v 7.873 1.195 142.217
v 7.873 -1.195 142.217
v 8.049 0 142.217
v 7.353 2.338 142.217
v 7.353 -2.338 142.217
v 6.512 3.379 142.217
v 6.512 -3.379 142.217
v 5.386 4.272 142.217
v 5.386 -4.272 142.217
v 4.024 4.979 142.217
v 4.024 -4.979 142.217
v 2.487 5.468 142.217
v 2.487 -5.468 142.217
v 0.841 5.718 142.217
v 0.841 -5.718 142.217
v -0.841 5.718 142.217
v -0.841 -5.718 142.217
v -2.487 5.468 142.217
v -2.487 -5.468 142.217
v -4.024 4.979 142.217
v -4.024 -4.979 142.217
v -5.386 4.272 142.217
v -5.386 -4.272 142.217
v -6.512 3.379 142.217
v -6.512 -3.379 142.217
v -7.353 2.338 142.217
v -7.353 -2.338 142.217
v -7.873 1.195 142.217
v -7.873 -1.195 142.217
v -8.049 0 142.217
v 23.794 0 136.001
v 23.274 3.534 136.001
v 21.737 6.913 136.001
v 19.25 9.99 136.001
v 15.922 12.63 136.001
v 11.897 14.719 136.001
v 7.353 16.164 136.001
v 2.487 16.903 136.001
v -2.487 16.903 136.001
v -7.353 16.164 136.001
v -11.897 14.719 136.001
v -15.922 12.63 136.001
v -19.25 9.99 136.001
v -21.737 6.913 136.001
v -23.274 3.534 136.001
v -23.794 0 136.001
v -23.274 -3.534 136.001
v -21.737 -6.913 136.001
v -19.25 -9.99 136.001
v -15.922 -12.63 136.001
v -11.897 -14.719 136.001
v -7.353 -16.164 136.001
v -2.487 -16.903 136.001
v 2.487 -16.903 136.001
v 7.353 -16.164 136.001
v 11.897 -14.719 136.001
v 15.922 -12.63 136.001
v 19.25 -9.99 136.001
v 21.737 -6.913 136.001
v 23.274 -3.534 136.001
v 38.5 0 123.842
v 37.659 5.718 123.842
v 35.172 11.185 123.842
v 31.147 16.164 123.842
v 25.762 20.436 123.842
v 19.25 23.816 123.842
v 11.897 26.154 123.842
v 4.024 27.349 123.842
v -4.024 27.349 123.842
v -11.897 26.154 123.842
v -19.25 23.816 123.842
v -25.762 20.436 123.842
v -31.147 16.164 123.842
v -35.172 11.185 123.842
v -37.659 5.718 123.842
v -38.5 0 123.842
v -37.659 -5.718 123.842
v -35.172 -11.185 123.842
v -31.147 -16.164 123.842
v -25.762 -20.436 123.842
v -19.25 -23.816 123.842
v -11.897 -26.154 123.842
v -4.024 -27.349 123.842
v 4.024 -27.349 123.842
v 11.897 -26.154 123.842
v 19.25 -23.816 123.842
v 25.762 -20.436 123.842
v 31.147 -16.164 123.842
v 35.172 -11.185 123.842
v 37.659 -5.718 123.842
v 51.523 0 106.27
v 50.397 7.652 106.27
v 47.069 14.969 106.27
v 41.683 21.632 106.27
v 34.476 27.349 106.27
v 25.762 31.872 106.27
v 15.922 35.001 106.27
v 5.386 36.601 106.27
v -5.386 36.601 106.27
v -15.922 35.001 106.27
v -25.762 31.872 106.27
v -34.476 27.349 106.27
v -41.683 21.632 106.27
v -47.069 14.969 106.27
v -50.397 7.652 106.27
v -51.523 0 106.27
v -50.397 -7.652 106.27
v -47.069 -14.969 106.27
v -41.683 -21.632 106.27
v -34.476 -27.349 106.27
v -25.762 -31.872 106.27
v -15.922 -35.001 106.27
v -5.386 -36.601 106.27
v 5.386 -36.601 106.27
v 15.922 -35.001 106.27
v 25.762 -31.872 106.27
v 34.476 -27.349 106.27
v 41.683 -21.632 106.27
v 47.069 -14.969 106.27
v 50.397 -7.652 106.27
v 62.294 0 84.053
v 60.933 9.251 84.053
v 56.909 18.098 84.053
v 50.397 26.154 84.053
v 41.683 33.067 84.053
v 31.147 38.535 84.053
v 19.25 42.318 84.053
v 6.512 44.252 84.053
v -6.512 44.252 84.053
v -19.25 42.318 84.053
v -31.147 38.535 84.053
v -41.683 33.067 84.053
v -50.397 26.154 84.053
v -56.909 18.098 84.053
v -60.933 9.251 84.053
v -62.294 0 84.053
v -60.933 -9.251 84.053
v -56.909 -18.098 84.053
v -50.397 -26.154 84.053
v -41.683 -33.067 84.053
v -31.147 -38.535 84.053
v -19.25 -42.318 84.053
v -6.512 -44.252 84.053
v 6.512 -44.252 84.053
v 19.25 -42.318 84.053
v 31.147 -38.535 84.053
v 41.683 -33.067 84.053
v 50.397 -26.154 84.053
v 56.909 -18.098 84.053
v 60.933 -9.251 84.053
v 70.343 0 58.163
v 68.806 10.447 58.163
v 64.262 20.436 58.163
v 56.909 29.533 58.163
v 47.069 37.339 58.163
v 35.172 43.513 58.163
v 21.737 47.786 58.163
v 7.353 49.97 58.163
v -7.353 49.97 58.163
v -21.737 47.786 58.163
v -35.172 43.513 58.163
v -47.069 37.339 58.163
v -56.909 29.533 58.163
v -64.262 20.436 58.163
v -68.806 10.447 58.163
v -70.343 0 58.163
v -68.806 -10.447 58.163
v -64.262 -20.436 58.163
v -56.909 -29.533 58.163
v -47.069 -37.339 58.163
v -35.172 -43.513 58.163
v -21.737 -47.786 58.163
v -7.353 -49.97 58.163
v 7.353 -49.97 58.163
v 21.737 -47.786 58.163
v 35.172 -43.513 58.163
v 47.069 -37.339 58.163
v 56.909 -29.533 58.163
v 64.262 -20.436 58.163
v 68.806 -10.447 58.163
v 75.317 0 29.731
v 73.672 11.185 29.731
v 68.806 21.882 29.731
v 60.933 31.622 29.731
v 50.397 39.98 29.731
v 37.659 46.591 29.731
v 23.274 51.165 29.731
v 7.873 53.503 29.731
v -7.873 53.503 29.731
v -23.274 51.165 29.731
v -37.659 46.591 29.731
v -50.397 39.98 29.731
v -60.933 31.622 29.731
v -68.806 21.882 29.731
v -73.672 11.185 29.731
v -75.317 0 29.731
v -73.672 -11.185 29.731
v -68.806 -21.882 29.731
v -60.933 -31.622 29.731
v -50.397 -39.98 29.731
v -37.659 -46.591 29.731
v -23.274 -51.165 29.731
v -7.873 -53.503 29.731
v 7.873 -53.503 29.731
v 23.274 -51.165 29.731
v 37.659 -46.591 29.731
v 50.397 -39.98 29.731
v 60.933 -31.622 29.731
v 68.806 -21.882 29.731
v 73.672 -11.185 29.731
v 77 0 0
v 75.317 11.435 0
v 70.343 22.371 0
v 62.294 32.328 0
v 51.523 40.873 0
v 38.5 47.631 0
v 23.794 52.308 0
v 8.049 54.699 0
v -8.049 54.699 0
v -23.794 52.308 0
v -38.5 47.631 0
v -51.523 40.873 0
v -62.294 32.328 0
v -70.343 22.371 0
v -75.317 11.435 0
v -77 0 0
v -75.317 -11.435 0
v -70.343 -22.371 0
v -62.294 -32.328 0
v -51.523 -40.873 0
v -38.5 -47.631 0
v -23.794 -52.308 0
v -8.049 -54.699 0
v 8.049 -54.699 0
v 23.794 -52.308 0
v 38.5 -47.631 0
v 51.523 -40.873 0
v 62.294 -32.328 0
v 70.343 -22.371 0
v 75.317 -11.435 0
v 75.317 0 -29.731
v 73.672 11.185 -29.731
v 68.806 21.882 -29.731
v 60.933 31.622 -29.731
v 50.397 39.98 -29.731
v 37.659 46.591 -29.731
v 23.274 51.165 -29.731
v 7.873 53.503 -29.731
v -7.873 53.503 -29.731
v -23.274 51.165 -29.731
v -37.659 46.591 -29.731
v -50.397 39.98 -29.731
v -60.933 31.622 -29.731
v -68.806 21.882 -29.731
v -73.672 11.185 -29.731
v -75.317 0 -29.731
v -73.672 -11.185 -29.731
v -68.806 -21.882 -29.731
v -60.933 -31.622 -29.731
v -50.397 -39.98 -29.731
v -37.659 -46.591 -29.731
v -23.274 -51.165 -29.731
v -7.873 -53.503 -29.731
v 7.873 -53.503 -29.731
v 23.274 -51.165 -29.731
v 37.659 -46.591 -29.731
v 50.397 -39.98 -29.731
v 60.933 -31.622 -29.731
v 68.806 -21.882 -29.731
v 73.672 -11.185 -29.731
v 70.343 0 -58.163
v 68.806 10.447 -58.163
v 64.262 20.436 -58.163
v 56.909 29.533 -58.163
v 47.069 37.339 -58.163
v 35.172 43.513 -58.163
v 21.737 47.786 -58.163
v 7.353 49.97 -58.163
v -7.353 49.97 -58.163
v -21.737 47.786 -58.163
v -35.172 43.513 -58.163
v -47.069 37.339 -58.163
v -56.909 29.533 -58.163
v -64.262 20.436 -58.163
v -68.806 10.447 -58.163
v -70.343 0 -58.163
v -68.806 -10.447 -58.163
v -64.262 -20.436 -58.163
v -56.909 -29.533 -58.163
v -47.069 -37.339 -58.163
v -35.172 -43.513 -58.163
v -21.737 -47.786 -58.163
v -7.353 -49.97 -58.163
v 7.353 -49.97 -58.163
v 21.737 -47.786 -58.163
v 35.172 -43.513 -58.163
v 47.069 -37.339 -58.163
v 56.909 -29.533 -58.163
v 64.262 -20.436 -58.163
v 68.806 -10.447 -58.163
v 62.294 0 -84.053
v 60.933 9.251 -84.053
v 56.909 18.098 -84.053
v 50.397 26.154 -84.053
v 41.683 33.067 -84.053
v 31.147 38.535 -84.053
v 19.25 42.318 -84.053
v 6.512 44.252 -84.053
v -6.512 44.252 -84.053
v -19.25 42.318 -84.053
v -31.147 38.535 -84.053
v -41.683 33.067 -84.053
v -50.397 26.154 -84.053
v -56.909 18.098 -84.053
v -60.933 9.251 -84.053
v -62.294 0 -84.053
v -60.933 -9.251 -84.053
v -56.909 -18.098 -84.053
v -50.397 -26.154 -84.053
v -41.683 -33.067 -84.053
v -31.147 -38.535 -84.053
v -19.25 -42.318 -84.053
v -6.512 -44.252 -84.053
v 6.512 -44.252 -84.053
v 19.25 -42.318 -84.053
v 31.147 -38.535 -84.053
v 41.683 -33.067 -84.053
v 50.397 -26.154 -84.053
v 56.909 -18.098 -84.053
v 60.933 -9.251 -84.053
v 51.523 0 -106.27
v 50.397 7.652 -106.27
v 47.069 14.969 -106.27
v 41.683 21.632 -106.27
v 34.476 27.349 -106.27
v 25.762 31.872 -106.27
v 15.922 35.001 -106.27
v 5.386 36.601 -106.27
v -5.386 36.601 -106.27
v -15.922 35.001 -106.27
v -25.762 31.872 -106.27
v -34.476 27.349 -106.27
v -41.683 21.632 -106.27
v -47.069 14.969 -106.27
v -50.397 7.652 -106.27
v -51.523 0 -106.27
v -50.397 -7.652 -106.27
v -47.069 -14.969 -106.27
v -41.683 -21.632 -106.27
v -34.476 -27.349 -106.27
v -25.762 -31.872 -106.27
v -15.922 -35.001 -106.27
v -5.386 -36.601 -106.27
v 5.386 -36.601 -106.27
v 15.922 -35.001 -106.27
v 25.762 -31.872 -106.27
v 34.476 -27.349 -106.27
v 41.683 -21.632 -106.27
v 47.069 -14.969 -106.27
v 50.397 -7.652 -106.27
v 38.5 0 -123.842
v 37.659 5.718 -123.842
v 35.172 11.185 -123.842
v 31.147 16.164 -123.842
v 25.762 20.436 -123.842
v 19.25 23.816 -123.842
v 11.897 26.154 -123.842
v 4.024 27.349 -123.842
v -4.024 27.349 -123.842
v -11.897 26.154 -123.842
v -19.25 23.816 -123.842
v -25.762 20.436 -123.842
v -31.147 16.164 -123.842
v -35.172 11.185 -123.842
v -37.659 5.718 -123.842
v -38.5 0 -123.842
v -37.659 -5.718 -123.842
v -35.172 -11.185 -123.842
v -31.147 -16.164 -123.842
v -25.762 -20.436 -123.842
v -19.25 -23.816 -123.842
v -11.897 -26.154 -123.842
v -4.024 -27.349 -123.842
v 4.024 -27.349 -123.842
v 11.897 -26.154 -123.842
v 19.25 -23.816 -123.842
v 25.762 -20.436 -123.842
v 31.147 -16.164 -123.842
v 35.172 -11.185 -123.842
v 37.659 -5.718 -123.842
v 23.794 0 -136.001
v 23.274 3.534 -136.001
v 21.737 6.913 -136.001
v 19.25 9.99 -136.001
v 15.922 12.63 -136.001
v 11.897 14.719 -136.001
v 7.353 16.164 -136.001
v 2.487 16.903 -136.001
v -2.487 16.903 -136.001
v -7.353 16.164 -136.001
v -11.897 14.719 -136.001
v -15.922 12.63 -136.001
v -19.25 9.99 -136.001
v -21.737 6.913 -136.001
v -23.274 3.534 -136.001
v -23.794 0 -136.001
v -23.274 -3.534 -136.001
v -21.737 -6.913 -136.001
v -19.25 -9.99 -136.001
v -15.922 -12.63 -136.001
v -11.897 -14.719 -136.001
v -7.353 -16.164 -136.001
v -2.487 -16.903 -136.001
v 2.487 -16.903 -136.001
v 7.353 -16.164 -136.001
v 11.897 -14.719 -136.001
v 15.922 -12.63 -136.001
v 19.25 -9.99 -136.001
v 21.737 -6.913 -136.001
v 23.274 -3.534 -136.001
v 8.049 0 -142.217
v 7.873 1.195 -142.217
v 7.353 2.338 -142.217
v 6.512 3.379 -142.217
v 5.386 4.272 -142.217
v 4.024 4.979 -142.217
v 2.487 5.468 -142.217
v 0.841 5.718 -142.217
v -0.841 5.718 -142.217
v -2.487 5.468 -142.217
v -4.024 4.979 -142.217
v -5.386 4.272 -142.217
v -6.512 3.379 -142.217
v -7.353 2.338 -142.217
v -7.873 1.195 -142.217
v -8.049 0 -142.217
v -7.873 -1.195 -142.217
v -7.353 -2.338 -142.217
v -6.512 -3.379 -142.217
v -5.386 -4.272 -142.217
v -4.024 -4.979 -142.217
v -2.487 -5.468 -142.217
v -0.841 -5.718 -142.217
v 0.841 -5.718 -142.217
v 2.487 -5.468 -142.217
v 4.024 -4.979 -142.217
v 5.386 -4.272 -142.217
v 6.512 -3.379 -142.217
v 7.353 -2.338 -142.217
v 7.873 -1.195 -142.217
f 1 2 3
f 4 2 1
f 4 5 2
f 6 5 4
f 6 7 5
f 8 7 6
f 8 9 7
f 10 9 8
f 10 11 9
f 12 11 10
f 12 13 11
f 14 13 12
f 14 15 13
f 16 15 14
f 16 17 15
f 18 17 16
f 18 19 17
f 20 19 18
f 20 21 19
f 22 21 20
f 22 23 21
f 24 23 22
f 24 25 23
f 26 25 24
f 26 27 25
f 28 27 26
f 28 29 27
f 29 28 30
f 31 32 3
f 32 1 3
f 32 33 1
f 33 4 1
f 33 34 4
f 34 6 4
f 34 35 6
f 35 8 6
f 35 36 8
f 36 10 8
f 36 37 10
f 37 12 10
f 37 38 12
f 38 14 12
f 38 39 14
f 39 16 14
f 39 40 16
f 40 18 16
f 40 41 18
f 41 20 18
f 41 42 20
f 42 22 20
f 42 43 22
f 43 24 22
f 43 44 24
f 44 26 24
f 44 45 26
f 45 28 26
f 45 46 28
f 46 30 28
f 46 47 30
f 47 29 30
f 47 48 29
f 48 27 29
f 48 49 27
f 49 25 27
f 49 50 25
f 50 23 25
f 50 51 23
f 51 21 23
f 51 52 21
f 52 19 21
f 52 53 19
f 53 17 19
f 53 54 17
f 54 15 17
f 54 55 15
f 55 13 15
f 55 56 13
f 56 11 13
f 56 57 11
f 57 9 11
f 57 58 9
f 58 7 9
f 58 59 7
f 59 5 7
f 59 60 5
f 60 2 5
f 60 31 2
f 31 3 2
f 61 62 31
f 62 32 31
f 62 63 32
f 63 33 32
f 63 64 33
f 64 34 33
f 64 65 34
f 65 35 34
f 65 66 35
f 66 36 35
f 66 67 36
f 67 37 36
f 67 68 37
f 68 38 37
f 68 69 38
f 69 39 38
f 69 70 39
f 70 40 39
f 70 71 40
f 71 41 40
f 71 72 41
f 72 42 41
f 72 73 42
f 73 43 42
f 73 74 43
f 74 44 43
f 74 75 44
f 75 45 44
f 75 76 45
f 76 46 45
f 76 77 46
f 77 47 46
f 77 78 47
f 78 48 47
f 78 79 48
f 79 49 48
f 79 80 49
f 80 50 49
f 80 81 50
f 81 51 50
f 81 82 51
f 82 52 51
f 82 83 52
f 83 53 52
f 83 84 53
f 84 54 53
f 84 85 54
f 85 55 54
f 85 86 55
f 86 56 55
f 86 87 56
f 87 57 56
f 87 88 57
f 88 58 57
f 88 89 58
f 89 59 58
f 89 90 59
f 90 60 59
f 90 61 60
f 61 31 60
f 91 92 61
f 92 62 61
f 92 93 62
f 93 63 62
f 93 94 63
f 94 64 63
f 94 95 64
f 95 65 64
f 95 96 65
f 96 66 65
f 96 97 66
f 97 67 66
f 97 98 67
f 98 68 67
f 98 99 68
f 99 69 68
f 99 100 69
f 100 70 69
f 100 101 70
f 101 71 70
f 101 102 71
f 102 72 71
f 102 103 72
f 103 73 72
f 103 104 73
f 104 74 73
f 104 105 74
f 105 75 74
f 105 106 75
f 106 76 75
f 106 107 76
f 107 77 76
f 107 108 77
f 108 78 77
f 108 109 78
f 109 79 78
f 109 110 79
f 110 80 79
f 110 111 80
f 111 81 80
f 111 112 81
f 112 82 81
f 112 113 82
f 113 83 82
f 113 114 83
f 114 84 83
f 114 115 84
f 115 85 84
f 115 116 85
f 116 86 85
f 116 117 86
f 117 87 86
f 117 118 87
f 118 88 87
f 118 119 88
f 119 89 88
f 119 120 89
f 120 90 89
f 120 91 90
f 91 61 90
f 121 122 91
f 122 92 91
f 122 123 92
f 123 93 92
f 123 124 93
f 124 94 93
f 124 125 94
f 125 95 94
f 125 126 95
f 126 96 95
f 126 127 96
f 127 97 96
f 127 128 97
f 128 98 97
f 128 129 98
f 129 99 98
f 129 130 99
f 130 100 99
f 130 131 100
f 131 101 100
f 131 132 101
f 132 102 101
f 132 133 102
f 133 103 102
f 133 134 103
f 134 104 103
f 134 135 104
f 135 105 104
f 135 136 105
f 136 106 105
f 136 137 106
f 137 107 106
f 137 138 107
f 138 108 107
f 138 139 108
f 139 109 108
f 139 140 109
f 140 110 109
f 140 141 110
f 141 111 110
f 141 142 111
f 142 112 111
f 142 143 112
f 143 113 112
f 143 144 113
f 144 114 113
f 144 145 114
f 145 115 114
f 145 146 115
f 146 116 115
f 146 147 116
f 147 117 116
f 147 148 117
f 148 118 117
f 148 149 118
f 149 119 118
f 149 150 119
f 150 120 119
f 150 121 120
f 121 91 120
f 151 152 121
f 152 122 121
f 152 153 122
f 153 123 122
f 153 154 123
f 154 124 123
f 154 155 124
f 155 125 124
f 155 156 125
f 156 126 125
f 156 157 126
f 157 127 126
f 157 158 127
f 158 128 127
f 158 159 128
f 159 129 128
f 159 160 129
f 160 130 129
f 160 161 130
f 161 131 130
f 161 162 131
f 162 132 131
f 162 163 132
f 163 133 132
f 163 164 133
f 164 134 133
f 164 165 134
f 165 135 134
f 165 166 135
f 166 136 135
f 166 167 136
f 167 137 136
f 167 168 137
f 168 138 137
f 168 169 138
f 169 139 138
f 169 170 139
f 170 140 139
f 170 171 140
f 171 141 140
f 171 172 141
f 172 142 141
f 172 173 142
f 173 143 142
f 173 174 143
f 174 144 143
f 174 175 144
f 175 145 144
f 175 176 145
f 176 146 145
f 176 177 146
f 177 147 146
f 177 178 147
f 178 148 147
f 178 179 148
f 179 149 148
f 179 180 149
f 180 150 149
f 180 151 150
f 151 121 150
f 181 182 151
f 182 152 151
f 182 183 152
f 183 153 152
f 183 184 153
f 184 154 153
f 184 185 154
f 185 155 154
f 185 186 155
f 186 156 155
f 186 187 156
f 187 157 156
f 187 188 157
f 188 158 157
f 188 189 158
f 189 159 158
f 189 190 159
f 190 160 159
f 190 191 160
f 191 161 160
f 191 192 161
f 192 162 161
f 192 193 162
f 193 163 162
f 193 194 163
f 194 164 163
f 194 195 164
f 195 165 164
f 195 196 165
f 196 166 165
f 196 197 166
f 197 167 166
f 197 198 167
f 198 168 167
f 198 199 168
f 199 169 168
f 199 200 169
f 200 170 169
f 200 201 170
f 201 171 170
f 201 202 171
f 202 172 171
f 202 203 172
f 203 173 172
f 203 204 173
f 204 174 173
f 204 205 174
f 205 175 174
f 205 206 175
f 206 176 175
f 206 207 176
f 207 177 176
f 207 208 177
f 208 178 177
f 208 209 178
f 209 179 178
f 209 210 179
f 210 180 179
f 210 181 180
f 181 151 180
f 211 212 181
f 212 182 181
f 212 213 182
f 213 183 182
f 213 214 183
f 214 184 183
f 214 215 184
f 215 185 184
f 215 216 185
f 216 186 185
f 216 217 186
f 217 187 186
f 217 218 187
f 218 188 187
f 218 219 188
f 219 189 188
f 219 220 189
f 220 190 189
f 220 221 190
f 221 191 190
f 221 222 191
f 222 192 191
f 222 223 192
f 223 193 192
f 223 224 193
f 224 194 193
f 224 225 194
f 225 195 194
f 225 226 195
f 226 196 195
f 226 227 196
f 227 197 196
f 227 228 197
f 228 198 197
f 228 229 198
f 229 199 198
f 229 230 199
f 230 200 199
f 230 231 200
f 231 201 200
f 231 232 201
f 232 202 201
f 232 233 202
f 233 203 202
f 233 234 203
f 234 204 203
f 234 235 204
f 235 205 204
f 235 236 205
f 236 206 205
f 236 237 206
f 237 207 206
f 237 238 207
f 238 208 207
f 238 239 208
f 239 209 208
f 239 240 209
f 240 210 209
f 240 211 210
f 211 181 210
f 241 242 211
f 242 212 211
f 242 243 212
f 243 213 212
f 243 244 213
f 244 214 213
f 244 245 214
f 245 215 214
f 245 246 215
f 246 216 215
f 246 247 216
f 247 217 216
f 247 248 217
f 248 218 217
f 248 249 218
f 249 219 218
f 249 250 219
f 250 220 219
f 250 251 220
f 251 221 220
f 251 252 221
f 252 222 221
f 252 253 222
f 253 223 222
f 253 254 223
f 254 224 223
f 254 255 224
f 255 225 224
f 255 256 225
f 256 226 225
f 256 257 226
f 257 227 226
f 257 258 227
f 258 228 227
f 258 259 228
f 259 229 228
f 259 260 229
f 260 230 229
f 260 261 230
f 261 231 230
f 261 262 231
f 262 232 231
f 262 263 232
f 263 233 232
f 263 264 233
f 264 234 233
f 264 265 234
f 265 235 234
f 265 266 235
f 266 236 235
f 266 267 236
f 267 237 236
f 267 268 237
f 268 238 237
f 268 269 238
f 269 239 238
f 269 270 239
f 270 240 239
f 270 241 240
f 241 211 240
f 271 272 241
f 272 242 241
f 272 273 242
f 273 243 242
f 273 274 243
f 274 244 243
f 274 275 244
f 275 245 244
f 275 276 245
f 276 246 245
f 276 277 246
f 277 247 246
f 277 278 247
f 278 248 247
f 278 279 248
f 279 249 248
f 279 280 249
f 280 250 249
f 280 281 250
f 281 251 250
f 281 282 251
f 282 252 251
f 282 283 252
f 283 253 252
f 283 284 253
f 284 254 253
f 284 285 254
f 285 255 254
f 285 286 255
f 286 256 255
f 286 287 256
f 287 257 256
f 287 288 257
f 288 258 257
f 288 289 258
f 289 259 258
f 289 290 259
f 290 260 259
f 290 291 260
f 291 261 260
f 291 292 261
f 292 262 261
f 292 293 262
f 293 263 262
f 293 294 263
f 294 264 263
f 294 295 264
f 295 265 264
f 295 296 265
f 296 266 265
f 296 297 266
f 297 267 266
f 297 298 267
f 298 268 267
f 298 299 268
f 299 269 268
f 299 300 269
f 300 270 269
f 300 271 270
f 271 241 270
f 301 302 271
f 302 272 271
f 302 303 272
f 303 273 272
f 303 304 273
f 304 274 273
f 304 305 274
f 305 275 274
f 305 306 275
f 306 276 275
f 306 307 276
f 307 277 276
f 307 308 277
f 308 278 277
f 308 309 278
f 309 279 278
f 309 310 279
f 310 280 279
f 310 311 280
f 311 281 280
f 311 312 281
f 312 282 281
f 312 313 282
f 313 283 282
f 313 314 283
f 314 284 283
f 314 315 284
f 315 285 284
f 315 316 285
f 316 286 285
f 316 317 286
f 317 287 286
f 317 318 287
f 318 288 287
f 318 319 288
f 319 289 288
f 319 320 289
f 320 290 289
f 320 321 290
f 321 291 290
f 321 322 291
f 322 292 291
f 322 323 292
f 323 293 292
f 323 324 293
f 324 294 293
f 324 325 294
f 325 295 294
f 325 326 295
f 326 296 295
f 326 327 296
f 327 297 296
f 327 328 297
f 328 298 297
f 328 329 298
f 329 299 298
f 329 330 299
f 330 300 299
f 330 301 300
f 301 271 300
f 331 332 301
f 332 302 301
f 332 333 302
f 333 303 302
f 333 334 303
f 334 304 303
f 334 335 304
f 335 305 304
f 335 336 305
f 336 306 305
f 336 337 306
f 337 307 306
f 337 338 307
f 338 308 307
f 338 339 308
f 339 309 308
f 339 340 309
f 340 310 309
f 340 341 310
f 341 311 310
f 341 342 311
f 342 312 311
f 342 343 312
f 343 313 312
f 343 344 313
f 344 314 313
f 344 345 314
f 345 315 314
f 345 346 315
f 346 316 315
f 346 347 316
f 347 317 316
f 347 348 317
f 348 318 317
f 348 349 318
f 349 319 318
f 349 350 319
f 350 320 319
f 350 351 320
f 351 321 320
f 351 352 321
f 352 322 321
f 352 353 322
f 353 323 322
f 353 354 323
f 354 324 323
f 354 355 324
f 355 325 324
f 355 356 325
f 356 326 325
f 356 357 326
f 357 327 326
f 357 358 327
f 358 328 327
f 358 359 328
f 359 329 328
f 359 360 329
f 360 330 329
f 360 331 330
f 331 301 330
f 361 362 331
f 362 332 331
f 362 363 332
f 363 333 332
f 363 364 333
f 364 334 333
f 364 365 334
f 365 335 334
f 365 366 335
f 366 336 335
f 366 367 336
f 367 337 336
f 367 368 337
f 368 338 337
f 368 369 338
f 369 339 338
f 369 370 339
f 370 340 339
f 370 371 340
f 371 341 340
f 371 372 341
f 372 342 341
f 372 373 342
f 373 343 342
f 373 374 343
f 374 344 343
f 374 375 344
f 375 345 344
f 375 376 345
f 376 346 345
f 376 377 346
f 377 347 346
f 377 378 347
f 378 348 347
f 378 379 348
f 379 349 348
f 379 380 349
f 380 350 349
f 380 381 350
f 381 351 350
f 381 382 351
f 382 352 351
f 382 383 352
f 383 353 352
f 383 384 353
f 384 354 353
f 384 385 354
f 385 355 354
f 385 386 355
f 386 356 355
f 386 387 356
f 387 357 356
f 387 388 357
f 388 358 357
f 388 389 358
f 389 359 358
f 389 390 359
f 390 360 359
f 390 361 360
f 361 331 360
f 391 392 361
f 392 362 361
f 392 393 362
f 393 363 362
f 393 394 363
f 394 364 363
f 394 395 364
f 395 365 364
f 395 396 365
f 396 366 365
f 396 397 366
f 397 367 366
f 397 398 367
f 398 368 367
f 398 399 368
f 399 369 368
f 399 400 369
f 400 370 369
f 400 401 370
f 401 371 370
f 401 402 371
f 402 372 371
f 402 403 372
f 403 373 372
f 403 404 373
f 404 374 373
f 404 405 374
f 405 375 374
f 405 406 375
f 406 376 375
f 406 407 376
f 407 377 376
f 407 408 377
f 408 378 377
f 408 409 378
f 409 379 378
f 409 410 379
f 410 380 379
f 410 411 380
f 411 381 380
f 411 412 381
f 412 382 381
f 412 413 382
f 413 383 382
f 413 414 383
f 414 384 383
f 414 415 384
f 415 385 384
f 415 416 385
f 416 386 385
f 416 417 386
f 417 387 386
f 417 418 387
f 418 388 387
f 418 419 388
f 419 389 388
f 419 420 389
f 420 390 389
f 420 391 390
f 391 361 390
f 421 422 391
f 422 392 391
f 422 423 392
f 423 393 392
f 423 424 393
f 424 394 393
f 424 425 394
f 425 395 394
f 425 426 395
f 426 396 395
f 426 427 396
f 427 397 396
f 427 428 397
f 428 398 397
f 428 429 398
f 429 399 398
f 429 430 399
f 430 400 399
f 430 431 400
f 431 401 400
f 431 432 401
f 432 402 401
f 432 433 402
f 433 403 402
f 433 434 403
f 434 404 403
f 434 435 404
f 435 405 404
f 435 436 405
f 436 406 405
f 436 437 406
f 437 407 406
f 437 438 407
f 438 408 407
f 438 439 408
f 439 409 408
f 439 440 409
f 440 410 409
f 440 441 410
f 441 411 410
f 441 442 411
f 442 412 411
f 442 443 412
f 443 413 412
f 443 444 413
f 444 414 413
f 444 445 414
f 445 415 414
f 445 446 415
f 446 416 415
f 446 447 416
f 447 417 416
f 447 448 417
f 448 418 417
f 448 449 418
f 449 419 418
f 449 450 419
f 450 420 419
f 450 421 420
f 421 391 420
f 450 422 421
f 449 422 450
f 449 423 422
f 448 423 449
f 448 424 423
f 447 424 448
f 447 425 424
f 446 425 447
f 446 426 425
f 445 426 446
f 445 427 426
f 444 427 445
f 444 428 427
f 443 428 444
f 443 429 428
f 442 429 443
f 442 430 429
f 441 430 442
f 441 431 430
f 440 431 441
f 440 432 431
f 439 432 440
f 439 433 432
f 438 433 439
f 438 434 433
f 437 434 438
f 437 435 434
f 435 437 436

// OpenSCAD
// Generated by SolidPython 1.0.1 on 2020-07-29 00:46:47


scale(v = [7, 5, 13]) {
	sphere(r = 11);
}
/***********************************************
*********      SolidPython code:      **********
************************************************
 
# import packages: SolidPython
from solid import *
from solid.utils import *
from itertools import chain, combinations, permutations


class Resize:

    def __init__(self, scad_file):
        self.scad_file = scad_file
        #self.scad_file = import_scad(scad_file)
        # cone/cylinder param:
        self.r1 = 0
        self.r2 = 0
        self.h = 0
        # rectangular prism param:
        self.w = 0
        self.l = 0
        # ellipse param:
        self.r = 0

    # import OpenScad code (file name corresponds to shape)


    # classify shape + parameters
    def assign(self, param1, param2, param3):
        if self.scad_file == 'cone.scad':
            self.r1 = param1
            self.r2 = param2
            self.h = param3
        elif self.scad_file == 'cylinder.scad':
            self.r1 = param1
            self.r2 = param2
            self.h = param3
        elif self.scad_file == 'rectangularPrism.scad':
            self.h = param1
            self.l = param2
            self.w = param3
        else:
            self.r = param1
            self.h = param2

    # resize parameters
    def iterate(self):
        x = range(3, 20, 2)
        i = 1
        if self.scad_file == 'cone.scad':
            tempList = list(permutations(x, 2))
            for temp in tempList:
                param1 = temp[0]
                param2 = temp[1]
                filepath = 'produced_scad_files/' + 'cone' + str(param1) + '_' + str(param2) + '_' + '.scad'
                scad_render_to_file(cylinder(h=param1, r1=param2, r2=0), filepath)

        elif self.scad_file == 'cylinder.scad':
            tempList = list(permutations(x, 3))
            for temp in tempList:
                param1 = temp[0]
                param2 = temp[1]
                filepath = 'produced_scad_files/' + 'cylinder' + str(param1) + '_' + str(param2) + '_' + '.scad'
                scad_render_to_file(cylinder(h=param1, r1=param2, r2=param2), filepath)

        elif self.scad_file == 'rectangularPrism.scad':
            tempList = list(permutations(x, 3))
            for temp in tempList:
                param1 = temp[0]
                param2 = temp[1]
                param3 = temp[2]
                filepath = 'produced_scad_files/' + 'rectangularPrism' + str(param1) + '_' + str(param2) + '_' + str(
                    param3) + '.scad'
                scad_render_to_file(cube(size=(param1, param2, param3)), filepath)

        elif self.scad_file == 'ellipse.scad':
            tempList = list(permutations(x, 4))
            for temp in tempList:
                param1 = temp[0]
                param2 = temp[1]
                param3 = temp[2]
                param4 = temp[3]
                filepath = 'produced_scad_files/' + 'ellipse' + str(param1) + '_' + str(param2) + '_' + str(param3) + '_' + str(param4) + '.scad'
                scad_render_to_file(scale([param1, param2, param3])(sphere(r=param4)), filepath)

    def render_to_scadfile(self):
        scad_render_to_file(scad, 'example.scad') 
 
************************************************/
